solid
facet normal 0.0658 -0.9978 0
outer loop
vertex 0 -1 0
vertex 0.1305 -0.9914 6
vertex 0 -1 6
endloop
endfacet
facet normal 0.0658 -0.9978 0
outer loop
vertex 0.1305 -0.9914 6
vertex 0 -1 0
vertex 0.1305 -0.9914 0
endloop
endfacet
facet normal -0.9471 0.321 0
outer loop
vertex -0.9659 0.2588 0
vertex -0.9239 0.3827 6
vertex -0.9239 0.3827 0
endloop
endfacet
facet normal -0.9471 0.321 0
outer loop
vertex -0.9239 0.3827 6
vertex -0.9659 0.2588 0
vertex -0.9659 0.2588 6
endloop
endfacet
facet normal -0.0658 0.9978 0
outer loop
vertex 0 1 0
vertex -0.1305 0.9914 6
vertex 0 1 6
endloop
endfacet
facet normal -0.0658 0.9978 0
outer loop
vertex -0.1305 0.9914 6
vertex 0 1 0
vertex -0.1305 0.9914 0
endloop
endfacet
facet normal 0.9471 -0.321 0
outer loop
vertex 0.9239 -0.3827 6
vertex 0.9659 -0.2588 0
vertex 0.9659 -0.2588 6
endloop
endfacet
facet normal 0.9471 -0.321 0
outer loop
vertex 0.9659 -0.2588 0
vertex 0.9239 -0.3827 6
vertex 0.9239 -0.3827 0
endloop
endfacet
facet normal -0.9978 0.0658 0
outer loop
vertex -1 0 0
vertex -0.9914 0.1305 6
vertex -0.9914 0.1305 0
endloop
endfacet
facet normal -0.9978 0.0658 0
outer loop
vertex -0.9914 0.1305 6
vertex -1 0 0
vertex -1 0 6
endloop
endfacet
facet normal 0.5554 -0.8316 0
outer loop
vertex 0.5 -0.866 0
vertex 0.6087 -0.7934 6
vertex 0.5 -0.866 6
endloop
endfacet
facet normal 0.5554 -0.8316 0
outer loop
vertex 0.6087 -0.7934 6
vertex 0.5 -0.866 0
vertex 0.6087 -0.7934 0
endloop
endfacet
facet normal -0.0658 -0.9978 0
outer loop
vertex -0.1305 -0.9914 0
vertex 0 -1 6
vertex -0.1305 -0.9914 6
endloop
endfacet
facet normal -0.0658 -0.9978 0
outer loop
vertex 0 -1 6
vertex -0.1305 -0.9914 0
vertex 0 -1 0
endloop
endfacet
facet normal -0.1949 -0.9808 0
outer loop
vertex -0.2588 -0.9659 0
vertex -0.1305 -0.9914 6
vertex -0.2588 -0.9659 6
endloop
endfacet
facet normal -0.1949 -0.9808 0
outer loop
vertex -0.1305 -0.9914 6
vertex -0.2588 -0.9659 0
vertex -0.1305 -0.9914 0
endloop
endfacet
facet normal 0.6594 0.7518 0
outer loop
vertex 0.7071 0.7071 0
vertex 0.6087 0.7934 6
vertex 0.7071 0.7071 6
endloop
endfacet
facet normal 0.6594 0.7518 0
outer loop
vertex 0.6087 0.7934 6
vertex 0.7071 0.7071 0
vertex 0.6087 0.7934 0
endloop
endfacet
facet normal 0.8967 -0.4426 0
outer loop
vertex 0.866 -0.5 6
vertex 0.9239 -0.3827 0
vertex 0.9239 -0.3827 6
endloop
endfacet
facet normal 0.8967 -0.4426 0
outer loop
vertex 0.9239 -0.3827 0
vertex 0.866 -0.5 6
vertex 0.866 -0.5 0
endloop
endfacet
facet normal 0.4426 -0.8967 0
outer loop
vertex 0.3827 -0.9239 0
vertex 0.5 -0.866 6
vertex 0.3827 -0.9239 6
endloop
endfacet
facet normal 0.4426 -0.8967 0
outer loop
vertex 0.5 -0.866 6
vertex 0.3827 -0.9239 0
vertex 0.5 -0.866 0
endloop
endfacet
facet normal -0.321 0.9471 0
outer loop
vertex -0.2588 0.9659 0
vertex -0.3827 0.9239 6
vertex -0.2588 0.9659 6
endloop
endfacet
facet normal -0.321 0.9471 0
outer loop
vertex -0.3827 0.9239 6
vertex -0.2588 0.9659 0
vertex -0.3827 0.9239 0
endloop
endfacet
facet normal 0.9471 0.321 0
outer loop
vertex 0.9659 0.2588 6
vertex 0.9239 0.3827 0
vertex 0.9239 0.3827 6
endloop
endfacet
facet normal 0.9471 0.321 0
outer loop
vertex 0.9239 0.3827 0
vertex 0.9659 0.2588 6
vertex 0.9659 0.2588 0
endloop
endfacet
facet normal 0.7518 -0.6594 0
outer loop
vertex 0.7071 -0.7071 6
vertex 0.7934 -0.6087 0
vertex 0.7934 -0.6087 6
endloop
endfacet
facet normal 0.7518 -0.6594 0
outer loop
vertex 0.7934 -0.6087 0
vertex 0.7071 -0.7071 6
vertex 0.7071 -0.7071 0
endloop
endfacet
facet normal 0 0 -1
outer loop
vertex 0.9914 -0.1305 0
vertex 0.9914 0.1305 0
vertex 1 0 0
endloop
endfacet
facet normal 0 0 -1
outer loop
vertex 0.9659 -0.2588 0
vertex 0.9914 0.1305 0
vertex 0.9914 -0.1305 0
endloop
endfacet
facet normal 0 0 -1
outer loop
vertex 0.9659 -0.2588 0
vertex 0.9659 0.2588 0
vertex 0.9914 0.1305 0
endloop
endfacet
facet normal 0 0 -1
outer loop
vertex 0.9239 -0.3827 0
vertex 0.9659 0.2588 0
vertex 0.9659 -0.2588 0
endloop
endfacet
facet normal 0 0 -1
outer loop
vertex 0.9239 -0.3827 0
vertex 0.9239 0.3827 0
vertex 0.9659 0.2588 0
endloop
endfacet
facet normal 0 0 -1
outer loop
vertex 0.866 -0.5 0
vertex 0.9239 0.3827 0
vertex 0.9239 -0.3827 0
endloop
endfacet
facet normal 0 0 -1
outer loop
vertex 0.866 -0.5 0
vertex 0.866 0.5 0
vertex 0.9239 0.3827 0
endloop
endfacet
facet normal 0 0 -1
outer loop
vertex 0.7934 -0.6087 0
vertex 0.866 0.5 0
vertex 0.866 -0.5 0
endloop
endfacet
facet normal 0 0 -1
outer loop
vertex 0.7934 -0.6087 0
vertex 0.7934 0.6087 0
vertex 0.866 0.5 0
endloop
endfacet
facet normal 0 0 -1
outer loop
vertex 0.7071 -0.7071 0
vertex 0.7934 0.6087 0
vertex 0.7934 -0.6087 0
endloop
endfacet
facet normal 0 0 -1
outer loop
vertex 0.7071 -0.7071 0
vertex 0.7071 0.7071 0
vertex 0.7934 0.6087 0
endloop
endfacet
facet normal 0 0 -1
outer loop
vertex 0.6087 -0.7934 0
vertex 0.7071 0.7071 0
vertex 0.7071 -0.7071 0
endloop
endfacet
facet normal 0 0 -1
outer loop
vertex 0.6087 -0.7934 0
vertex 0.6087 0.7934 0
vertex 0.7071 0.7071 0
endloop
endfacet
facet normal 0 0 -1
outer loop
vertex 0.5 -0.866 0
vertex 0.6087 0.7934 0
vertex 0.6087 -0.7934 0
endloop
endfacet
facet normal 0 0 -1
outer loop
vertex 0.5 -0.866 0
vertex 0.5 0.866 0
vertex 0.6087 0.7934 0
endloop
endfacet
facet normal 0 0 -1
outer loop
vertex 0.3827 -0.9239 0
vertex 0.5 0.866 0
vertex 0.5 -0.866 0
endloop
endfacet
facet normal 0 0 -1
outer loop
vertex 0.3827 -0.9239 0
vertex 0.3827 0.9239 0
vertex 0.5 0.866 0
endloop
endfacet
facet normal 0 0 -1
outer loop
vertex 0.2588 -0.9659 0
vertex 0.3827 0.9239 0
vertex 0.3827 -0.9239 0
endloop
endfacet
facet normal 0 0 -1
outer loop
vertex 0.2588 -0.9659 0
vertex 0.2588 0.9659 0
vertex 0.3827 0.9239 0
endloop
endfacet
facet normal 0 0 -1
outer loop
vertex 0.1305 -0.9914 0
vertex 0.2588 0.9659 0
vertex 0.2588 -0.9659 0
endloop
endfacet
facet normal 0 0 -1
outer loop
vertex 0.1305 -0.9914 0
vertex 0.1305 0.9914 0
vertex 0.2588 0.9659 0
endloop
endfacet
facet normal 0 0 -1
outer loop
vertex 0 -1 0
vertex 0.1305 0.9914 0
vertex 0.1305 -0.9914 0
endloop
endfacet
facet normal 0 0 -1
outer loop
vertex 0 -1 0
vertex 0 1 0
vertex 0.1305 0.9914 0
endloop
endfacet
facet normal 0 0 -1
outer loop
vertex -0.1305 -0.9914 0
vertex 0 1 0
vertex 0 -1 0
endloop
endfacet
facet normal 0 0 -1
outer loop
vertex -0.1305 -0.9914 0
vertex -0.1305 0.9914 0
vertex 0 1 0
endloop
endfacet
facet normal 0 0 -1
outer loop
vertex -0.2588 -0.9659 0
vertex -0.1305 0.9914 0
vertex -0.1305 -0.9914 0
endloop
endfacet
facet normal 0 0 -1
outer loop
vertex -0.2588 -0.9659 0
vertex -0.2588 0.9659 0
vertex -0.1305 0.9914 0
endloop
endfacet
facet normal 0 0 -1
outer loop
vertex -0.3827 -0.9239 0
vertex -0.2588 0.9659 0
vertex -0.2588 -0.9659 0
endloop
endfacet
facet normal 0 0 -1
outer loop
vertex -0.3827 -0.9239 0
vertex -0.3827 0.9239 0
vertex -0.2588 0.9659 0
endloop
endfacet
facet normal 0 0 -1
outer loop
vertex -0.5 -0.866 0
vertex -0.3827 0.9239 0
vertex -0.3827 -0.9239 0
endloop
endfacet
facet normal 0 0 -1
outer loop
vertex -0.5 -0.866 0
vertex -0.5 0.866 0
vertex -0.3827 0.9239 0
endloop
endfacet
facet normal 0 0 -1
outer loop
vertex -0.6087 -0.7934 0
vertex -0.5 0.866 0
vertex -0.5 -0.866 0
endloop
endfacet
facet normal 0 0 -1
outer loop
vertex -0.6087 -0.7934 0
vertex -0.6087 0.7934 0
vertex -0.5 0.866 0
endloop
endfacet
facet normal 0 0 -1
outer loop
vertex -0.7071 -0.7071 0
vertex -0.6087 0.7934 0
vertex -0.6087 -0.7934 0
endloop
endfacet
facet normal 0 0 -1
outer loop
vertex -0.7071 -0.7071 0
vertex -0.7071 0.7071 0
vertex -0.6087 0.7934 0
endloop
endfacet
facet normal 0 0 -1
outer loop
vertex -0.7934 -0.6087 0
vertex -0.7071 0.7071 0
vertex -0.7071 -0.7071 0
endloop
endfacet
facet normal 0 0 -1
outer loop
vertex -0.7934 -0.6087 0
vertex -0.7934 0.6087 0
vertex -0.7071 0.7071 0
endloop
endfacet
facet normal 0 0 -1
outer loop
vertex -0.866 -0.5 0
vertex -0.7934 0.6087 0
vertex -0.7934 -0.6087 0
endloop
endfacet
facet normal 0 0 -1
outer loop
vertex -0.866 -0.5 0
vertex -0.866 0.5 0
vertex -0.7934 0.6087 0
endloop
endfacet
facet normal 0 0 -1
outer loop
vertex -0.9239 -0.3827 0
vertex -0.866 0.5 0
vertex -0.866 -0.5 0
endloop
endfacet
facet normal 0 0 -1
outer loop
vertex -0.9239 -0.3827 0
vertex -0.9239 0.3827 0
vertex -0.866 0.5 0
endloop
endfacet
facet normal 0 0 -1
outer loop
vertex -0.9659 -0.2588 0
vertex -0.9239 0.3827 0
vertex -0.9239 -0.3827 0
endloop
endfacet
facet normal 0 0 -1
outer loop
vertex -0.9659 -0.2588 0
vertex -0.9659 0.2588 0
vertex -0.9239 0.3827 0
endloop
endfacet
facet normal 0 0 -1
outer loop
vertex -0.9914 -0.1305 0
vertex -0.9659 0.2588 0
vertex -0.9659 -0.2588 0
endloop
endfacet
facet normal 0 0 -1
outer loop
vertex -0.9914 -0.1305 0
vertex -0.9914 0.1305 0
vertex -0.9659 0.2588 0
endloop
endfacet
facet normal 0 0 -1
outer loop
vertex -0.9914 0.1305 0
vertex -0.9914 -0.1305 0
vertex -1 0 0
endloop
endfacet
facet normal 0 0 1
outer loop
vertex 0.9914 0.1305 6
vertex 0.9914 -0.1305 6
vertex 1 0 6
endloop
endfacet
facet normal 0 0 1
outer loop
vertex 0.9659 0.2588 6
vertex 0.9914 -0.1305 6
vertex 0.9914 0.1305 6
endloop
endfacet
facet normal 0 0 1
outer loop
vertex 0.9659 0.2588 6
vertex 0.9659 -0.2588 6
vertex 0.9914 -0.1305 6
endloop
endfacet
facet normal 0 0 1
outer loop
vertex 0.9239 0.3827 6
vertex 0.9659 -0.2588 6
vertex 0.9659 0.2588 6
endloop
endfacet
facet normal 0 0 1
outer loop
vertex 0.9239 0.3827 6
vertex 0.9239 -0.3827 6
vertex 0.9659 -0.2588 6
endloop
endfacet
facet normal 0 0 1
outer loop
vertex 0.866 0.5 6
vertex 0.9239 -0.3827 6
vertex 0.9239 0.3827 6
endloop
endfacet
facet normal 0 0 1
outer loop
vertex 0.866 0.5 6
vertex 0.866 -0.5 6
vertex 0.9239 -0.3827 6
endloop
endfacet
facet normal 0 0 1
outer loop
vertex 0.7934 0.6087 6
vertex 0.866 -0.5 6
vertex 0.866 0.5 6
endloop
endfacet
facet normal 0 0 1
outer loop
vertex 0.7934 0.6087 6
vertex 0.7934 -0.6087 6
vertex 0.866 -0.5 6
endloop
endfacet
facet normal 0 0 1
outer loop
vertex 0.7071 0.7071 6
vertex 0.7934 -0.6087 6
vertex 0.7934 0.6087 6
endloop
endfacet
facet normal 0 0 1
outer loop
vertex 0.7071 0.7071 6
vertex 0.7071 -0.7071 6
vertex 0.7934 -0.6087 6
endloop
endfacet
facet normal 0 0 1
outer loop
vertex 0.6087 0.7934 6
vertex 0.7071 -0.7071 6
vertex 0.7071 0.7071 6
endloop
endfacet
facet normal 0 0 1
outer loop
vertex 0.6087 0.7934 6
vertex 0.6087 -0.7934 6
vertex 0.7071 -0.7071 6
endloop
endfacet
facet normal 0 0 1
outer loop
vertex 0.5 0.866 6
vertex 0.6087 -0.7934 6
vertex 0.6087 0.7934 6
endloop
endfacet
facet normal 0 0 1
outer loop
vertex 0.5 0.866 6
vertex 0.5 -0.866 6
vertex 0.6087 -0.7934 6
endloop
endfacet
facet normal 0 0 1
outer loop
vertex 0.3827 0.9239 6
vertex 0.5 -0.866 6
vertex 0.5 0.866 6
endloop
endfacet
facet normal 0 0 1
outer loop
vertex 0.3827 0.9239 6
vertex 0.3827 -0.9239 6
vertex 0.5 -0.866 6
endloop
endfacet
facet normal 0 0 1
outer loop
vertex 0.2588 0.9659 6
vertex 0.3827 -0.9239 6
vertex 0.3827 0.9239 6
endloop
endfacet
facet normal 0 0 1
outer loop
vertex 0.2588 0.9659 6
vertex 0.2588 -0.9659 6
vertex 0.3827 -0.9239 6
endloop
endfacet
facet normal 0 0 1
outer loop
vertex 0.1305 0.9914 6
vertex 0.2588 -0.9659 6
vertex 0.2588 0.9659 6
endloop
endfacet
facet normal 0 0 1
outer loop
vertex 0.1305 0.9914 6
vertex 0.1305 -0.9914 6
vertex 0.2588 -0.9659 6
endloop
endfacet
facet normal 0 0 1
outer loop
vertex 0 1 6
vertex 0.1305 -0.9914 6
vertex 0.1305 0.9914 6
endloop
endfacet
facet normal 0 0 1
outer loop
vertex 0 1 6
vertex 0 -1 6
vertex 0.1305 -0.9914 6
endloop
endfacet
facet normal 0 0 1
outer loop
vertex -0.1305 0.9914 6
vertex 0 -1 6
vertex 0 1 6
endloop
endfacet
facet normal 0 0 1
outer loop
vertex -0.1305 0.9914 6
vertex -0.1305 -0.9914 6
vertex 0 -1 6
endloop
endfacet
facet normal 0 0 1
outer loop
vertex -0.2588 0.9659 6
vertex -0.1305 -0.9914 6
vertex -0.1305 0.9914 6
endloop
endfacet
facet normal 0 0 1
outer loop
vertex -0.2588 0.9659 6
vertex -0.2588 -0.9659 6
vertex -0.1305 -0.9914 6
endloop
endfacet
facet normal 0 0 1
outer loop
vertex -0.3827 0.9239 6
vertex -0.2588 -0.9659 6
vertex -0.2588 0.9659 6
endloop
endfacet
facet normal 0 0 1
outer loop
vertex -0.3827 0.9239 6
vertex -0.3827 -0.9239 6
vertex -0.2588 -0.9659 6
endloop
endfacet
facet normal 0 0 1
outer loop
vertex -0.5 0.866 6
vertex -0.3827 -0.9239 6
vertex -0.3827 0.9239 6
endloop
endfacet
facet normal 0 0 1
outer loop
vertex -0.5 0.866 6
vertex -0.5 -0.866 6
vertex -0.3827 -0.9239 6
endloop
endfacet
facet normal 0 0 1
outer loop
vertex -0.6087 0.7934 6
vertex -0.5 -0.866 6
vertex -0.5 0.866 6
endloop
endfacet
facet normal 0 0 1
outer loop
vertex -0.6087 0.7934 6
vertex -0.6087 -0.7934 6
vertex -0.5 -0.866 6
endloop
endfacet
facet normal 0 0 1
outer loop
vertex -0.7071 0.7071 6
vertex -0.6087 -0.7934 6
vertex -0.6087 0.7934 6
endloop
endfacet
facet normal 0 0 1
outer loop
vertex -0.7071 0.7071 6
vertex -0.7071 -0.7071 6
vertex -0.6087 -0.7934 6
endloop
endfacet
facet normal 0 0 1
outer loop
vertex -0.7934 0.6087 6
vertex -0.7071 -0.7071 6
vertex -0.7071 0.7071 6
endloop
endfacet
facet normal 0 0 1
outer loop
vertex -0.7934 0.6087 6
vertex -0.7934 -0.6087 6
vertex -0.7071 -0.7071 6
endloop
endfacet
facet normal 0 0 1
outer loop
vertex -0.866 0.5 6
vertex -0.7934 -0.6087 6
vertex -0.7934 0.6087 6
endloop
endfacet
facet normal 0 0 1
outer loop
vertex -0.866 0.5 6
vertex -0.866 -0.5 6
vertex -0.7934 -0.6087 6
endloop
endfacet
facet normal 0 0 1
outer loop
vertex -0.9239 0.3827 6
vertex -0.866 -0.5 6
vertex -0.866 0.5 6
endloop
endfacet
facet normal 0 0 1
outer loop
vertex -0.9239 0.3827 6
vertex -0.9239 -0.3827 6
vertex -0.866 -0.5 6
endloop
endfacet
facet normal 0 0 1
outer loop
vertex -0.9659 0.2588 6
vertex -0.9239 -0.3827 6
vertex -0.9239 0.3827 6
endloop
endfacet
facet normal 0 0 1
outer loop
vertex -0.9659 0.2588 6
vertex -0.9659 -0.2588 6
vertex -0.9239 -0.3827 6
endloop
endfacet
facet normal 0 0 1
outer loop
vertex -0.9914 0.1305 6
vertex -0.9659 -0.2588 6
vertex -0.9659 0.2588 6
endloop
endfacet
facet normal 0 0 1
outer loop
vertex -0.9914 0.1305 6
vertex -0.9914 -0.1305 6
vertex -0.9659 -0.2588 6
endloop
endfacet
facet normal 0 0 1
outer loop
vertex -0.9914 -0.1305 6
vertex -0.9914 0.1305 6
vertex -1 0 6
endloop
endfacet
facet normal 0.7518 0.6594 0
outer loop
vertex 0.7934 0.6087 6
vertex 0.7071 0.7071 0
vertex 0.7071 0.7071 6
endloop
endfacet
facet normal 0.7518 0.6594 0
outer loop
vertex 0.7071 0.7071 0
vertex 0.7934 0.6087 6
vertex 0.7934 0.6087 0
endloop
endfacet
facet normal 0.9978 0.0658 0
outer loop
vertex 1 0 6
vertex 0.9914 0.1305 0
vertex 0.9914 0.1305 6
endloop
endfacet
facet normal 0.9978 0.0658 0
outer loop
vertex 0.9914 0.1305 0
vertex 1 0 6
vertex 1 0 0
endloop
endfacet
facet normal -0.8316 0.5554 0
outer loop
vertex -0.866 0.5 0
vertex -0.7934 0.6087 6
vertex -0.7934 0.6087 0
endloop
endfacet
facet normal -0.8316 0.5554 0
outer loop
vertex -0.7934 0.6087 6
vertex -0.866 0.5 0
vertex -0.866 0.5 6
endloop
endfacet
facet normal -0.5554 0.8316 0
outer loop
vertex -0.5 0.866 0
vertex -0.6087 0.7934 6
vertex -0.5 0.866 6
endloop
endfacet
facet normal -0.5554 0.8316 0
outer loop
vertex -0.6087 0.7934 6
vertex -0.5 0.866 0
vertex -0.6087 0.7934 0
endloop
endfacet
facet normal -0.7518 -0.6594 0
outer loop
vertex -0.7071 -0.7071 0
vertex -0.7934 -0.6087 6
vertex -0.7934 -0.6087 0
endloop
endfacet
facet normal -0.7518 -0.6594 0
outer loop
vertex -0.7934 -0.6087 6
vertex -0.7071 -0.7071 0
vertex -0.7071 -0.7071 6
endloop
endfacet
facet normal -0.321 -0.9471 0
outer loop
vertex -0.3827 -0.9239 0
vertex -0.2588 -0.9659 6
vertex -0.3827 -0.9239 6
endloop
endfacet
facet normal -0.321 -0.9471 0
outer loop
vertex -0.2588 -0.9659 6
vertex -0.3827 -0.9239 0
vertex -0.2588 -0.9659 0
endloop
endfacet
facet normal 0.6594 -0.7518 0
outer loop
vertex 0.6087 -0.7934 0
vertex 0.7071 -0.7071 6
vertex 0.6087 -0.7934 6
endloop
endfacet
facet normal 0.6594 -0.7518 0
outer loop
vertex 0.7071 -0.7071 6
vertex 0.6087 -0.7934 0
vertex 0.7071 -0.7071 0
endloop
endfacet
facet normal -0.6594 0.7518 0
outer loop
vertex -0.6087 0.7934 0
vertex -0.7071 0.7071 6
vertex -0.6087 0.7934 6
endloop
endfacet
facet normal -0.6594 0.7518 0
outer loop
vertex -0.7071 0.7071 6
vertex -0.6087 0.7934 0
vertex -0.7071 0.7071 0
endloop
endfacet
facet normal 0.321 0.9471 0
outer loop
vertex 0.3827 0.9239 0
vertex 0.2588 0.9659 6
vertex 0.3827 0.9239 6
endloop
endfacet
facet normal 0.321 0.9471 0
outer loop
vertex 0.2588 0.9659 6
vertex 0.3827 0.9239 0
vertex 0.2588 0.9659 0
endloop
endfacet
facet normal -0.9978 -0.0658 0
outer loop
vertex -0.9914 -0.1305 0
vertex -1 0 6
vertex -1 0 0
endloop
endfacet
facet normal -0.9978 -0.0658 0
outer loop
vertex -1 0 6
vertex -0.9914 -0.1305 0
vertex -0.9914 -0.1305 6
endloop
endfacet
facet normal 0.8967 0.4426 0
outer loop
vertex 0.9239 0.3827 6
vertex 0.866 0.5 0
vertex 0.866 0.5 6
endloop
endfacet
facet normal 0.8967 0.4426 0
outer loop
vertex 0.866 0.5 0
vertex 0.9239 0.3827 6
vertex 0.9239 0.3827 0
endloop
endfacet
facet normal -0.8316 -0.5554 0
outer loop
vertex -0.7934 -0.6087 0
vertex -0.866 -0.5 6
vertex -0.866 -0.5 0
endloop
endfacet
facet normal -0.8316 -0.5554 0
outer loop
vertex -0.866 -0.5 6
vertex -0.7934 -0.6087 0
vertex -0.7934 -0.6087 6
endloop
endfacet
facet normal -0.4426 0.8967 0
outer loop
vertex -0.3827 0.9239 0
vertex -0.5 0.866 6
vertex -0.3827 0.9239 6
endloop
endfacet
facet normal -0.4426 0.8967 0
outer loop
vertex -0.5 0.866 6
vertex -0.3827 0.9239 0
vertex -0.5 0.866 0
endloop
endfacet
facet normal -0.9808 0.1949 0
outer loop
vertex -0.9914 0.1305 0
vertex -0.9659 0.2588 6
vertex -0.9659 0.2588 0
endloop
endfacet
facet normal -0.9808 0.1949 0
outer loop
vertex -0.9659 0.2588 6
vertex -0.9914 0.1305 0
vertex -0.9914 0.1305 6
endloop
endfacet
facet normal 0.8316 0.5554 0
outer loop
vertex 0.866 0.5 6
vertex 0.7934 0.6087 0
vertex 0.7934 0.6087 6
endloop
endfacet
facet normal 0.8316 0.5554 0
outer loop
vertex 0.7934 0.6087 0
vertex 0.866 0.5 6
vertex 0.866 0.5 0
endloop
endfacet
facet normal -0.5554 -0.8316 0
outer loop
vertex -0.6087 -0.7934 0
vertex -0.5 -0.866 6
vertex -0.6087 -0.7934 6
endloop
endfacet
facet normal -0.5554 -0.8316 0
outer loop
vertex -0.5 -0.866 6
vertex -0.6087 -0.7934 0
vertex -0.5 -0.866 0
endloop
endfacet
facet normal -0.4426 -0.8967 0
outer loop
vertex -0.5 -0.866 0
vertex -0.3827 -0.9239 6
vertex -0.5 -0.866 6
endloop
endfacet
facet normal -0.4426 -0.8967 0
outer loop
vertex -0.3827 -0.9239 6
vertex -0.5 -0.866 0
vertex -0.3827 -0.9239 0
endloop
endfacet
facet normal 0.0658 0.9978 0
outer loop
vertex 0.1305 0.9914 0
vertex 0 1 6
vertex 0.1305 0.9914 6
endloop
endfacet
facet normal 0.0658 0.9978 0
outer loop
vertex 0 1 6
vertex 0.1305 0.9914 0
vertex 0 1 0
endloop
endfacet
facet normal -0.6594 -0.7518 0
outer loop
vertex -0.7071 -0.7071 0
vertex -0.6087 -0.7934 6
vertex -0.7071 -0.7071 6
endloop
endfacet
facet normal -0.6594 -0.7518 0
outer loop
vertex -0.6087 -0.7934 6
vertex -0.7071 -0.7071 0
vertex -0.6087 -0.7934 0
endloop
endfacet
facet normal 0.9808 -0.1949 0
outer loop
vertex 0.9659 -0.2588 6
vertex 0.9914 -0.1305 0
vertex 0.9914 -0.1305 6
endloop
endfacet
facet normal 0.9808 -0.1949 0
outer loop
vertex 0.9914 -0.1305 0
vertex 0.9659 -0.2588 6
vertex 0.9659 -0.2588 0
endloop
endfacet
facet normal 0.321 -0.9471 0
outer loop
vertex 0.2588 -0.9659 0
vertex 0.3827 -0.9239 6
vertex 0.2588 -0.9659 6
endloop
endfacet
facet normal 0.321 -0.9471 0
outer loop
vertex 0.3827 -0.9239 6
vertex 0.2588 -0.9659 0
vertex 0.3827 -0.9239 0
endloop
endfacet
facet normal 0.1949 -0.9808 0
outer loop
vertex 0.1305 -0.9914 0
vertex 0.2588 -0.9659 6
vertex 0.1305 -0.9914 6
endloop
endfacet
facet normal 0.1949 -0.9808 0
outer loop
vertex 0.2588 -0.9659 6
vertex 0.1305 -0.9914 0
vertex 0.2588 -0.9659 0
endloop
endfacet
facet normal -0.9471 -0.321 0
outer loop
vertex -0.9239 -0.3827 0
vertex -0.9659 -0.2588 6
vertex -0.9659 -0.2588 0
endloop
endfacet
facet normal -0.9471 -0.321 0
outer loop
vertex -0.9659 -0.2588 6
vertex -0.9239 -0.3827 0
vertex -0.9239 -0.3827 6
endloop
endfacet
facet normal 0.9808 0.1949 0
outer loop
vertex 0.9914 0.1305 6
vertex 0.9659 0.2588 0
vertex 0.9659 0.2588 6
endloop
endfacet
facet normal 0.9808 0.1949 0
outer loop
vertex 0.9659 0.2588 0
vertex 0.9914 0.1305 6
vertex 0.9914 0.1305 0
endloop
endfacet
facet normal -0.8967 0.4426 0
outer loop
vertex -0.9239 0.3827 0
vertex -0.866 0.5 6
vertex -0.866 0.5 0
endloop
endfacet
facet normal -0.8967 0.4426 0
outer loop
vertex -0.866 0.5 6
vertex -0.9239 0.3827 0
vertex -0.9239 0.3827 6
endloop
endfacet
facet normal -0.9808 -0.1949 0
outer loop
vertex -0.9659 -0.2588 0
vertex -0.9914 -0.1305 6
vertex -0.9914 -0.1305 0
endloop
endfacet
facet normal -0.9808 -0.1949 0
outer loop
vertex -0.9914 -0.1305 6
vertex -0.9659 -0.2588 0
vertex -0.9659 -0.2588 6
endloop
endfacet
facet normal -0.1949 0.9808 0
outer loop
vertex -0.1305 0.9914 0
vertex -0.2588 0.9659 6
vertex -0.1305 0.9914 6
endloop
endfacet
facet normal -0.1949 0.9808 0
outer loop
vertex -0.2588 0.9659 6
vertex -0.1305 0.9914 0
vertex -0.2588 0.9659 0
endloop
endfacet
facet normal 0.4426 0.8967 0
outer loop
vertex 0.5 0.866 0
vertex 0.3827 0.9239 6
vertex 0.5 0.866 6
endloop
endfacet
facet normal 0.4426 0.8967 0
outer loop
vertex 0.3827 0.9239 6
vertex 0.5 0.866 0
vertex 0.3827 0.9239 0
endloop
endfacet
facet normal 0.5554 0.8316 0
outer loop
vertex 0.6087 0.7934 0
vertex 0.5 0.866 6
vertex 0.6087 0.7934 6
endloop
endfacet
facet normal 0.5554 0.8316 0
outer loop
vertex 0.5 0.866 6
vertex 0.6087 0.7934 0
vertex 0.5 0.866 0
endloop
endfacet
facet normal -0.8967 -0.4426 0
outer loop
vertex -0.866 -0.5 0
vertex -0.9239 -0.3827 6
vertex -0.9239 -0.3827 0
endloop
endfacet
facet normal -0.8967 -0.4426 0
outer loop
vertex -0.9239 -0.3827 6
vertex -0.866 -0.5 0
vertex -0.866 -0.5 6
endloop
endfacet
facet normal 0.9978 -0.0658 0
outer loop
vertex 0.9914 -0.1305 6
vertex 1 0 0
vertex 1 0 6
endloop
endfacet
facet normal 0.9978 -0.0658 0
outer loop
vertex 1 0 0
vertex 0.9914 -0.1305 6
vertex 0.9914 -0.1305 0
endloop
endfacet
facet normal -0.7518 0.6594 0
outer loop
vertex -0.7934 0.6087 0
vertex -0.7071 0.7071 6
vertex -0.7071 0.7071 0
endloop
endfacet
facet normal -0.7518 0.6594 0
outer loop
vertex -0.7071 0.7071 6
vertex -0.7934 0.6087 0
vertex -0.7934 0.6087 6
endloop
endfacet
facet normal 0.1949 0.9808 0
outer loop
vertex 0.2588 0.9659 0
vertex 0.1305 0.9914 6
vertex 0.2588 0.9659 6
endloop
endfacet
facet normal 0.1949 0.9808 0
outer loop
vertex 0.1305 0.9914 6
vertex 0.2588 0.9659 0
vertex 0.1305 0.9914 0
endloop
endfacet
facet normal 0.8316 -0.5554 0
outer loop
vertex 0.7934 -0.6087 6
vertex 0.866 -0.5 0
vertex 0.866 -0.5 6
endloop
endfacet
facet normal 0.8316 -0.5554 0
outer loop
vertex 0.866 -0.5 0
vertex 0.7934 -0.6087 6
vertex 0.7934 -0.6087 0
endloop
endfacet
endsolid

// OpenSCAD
$fn = 50;
use <c:/Program Files/OpenSCAD/libraries/MCAD/involute_gears.scad>


difference() {
	union() {
		gear(backlash = 0, bore_diameter = 0, circles = 0, circular_pitch = false, clearance = 0.2000000000, diametral_pitch = 0.5333330000, flat = false, gear_thickness = 6, hub_diameter = 0, hub_thickness = 0, involute_facets = 0, number_of_teeth = 24, pressure_angle = 28, rim_thickness = 6, rim_width = 0, twist = 0);
	}
	union();
}
